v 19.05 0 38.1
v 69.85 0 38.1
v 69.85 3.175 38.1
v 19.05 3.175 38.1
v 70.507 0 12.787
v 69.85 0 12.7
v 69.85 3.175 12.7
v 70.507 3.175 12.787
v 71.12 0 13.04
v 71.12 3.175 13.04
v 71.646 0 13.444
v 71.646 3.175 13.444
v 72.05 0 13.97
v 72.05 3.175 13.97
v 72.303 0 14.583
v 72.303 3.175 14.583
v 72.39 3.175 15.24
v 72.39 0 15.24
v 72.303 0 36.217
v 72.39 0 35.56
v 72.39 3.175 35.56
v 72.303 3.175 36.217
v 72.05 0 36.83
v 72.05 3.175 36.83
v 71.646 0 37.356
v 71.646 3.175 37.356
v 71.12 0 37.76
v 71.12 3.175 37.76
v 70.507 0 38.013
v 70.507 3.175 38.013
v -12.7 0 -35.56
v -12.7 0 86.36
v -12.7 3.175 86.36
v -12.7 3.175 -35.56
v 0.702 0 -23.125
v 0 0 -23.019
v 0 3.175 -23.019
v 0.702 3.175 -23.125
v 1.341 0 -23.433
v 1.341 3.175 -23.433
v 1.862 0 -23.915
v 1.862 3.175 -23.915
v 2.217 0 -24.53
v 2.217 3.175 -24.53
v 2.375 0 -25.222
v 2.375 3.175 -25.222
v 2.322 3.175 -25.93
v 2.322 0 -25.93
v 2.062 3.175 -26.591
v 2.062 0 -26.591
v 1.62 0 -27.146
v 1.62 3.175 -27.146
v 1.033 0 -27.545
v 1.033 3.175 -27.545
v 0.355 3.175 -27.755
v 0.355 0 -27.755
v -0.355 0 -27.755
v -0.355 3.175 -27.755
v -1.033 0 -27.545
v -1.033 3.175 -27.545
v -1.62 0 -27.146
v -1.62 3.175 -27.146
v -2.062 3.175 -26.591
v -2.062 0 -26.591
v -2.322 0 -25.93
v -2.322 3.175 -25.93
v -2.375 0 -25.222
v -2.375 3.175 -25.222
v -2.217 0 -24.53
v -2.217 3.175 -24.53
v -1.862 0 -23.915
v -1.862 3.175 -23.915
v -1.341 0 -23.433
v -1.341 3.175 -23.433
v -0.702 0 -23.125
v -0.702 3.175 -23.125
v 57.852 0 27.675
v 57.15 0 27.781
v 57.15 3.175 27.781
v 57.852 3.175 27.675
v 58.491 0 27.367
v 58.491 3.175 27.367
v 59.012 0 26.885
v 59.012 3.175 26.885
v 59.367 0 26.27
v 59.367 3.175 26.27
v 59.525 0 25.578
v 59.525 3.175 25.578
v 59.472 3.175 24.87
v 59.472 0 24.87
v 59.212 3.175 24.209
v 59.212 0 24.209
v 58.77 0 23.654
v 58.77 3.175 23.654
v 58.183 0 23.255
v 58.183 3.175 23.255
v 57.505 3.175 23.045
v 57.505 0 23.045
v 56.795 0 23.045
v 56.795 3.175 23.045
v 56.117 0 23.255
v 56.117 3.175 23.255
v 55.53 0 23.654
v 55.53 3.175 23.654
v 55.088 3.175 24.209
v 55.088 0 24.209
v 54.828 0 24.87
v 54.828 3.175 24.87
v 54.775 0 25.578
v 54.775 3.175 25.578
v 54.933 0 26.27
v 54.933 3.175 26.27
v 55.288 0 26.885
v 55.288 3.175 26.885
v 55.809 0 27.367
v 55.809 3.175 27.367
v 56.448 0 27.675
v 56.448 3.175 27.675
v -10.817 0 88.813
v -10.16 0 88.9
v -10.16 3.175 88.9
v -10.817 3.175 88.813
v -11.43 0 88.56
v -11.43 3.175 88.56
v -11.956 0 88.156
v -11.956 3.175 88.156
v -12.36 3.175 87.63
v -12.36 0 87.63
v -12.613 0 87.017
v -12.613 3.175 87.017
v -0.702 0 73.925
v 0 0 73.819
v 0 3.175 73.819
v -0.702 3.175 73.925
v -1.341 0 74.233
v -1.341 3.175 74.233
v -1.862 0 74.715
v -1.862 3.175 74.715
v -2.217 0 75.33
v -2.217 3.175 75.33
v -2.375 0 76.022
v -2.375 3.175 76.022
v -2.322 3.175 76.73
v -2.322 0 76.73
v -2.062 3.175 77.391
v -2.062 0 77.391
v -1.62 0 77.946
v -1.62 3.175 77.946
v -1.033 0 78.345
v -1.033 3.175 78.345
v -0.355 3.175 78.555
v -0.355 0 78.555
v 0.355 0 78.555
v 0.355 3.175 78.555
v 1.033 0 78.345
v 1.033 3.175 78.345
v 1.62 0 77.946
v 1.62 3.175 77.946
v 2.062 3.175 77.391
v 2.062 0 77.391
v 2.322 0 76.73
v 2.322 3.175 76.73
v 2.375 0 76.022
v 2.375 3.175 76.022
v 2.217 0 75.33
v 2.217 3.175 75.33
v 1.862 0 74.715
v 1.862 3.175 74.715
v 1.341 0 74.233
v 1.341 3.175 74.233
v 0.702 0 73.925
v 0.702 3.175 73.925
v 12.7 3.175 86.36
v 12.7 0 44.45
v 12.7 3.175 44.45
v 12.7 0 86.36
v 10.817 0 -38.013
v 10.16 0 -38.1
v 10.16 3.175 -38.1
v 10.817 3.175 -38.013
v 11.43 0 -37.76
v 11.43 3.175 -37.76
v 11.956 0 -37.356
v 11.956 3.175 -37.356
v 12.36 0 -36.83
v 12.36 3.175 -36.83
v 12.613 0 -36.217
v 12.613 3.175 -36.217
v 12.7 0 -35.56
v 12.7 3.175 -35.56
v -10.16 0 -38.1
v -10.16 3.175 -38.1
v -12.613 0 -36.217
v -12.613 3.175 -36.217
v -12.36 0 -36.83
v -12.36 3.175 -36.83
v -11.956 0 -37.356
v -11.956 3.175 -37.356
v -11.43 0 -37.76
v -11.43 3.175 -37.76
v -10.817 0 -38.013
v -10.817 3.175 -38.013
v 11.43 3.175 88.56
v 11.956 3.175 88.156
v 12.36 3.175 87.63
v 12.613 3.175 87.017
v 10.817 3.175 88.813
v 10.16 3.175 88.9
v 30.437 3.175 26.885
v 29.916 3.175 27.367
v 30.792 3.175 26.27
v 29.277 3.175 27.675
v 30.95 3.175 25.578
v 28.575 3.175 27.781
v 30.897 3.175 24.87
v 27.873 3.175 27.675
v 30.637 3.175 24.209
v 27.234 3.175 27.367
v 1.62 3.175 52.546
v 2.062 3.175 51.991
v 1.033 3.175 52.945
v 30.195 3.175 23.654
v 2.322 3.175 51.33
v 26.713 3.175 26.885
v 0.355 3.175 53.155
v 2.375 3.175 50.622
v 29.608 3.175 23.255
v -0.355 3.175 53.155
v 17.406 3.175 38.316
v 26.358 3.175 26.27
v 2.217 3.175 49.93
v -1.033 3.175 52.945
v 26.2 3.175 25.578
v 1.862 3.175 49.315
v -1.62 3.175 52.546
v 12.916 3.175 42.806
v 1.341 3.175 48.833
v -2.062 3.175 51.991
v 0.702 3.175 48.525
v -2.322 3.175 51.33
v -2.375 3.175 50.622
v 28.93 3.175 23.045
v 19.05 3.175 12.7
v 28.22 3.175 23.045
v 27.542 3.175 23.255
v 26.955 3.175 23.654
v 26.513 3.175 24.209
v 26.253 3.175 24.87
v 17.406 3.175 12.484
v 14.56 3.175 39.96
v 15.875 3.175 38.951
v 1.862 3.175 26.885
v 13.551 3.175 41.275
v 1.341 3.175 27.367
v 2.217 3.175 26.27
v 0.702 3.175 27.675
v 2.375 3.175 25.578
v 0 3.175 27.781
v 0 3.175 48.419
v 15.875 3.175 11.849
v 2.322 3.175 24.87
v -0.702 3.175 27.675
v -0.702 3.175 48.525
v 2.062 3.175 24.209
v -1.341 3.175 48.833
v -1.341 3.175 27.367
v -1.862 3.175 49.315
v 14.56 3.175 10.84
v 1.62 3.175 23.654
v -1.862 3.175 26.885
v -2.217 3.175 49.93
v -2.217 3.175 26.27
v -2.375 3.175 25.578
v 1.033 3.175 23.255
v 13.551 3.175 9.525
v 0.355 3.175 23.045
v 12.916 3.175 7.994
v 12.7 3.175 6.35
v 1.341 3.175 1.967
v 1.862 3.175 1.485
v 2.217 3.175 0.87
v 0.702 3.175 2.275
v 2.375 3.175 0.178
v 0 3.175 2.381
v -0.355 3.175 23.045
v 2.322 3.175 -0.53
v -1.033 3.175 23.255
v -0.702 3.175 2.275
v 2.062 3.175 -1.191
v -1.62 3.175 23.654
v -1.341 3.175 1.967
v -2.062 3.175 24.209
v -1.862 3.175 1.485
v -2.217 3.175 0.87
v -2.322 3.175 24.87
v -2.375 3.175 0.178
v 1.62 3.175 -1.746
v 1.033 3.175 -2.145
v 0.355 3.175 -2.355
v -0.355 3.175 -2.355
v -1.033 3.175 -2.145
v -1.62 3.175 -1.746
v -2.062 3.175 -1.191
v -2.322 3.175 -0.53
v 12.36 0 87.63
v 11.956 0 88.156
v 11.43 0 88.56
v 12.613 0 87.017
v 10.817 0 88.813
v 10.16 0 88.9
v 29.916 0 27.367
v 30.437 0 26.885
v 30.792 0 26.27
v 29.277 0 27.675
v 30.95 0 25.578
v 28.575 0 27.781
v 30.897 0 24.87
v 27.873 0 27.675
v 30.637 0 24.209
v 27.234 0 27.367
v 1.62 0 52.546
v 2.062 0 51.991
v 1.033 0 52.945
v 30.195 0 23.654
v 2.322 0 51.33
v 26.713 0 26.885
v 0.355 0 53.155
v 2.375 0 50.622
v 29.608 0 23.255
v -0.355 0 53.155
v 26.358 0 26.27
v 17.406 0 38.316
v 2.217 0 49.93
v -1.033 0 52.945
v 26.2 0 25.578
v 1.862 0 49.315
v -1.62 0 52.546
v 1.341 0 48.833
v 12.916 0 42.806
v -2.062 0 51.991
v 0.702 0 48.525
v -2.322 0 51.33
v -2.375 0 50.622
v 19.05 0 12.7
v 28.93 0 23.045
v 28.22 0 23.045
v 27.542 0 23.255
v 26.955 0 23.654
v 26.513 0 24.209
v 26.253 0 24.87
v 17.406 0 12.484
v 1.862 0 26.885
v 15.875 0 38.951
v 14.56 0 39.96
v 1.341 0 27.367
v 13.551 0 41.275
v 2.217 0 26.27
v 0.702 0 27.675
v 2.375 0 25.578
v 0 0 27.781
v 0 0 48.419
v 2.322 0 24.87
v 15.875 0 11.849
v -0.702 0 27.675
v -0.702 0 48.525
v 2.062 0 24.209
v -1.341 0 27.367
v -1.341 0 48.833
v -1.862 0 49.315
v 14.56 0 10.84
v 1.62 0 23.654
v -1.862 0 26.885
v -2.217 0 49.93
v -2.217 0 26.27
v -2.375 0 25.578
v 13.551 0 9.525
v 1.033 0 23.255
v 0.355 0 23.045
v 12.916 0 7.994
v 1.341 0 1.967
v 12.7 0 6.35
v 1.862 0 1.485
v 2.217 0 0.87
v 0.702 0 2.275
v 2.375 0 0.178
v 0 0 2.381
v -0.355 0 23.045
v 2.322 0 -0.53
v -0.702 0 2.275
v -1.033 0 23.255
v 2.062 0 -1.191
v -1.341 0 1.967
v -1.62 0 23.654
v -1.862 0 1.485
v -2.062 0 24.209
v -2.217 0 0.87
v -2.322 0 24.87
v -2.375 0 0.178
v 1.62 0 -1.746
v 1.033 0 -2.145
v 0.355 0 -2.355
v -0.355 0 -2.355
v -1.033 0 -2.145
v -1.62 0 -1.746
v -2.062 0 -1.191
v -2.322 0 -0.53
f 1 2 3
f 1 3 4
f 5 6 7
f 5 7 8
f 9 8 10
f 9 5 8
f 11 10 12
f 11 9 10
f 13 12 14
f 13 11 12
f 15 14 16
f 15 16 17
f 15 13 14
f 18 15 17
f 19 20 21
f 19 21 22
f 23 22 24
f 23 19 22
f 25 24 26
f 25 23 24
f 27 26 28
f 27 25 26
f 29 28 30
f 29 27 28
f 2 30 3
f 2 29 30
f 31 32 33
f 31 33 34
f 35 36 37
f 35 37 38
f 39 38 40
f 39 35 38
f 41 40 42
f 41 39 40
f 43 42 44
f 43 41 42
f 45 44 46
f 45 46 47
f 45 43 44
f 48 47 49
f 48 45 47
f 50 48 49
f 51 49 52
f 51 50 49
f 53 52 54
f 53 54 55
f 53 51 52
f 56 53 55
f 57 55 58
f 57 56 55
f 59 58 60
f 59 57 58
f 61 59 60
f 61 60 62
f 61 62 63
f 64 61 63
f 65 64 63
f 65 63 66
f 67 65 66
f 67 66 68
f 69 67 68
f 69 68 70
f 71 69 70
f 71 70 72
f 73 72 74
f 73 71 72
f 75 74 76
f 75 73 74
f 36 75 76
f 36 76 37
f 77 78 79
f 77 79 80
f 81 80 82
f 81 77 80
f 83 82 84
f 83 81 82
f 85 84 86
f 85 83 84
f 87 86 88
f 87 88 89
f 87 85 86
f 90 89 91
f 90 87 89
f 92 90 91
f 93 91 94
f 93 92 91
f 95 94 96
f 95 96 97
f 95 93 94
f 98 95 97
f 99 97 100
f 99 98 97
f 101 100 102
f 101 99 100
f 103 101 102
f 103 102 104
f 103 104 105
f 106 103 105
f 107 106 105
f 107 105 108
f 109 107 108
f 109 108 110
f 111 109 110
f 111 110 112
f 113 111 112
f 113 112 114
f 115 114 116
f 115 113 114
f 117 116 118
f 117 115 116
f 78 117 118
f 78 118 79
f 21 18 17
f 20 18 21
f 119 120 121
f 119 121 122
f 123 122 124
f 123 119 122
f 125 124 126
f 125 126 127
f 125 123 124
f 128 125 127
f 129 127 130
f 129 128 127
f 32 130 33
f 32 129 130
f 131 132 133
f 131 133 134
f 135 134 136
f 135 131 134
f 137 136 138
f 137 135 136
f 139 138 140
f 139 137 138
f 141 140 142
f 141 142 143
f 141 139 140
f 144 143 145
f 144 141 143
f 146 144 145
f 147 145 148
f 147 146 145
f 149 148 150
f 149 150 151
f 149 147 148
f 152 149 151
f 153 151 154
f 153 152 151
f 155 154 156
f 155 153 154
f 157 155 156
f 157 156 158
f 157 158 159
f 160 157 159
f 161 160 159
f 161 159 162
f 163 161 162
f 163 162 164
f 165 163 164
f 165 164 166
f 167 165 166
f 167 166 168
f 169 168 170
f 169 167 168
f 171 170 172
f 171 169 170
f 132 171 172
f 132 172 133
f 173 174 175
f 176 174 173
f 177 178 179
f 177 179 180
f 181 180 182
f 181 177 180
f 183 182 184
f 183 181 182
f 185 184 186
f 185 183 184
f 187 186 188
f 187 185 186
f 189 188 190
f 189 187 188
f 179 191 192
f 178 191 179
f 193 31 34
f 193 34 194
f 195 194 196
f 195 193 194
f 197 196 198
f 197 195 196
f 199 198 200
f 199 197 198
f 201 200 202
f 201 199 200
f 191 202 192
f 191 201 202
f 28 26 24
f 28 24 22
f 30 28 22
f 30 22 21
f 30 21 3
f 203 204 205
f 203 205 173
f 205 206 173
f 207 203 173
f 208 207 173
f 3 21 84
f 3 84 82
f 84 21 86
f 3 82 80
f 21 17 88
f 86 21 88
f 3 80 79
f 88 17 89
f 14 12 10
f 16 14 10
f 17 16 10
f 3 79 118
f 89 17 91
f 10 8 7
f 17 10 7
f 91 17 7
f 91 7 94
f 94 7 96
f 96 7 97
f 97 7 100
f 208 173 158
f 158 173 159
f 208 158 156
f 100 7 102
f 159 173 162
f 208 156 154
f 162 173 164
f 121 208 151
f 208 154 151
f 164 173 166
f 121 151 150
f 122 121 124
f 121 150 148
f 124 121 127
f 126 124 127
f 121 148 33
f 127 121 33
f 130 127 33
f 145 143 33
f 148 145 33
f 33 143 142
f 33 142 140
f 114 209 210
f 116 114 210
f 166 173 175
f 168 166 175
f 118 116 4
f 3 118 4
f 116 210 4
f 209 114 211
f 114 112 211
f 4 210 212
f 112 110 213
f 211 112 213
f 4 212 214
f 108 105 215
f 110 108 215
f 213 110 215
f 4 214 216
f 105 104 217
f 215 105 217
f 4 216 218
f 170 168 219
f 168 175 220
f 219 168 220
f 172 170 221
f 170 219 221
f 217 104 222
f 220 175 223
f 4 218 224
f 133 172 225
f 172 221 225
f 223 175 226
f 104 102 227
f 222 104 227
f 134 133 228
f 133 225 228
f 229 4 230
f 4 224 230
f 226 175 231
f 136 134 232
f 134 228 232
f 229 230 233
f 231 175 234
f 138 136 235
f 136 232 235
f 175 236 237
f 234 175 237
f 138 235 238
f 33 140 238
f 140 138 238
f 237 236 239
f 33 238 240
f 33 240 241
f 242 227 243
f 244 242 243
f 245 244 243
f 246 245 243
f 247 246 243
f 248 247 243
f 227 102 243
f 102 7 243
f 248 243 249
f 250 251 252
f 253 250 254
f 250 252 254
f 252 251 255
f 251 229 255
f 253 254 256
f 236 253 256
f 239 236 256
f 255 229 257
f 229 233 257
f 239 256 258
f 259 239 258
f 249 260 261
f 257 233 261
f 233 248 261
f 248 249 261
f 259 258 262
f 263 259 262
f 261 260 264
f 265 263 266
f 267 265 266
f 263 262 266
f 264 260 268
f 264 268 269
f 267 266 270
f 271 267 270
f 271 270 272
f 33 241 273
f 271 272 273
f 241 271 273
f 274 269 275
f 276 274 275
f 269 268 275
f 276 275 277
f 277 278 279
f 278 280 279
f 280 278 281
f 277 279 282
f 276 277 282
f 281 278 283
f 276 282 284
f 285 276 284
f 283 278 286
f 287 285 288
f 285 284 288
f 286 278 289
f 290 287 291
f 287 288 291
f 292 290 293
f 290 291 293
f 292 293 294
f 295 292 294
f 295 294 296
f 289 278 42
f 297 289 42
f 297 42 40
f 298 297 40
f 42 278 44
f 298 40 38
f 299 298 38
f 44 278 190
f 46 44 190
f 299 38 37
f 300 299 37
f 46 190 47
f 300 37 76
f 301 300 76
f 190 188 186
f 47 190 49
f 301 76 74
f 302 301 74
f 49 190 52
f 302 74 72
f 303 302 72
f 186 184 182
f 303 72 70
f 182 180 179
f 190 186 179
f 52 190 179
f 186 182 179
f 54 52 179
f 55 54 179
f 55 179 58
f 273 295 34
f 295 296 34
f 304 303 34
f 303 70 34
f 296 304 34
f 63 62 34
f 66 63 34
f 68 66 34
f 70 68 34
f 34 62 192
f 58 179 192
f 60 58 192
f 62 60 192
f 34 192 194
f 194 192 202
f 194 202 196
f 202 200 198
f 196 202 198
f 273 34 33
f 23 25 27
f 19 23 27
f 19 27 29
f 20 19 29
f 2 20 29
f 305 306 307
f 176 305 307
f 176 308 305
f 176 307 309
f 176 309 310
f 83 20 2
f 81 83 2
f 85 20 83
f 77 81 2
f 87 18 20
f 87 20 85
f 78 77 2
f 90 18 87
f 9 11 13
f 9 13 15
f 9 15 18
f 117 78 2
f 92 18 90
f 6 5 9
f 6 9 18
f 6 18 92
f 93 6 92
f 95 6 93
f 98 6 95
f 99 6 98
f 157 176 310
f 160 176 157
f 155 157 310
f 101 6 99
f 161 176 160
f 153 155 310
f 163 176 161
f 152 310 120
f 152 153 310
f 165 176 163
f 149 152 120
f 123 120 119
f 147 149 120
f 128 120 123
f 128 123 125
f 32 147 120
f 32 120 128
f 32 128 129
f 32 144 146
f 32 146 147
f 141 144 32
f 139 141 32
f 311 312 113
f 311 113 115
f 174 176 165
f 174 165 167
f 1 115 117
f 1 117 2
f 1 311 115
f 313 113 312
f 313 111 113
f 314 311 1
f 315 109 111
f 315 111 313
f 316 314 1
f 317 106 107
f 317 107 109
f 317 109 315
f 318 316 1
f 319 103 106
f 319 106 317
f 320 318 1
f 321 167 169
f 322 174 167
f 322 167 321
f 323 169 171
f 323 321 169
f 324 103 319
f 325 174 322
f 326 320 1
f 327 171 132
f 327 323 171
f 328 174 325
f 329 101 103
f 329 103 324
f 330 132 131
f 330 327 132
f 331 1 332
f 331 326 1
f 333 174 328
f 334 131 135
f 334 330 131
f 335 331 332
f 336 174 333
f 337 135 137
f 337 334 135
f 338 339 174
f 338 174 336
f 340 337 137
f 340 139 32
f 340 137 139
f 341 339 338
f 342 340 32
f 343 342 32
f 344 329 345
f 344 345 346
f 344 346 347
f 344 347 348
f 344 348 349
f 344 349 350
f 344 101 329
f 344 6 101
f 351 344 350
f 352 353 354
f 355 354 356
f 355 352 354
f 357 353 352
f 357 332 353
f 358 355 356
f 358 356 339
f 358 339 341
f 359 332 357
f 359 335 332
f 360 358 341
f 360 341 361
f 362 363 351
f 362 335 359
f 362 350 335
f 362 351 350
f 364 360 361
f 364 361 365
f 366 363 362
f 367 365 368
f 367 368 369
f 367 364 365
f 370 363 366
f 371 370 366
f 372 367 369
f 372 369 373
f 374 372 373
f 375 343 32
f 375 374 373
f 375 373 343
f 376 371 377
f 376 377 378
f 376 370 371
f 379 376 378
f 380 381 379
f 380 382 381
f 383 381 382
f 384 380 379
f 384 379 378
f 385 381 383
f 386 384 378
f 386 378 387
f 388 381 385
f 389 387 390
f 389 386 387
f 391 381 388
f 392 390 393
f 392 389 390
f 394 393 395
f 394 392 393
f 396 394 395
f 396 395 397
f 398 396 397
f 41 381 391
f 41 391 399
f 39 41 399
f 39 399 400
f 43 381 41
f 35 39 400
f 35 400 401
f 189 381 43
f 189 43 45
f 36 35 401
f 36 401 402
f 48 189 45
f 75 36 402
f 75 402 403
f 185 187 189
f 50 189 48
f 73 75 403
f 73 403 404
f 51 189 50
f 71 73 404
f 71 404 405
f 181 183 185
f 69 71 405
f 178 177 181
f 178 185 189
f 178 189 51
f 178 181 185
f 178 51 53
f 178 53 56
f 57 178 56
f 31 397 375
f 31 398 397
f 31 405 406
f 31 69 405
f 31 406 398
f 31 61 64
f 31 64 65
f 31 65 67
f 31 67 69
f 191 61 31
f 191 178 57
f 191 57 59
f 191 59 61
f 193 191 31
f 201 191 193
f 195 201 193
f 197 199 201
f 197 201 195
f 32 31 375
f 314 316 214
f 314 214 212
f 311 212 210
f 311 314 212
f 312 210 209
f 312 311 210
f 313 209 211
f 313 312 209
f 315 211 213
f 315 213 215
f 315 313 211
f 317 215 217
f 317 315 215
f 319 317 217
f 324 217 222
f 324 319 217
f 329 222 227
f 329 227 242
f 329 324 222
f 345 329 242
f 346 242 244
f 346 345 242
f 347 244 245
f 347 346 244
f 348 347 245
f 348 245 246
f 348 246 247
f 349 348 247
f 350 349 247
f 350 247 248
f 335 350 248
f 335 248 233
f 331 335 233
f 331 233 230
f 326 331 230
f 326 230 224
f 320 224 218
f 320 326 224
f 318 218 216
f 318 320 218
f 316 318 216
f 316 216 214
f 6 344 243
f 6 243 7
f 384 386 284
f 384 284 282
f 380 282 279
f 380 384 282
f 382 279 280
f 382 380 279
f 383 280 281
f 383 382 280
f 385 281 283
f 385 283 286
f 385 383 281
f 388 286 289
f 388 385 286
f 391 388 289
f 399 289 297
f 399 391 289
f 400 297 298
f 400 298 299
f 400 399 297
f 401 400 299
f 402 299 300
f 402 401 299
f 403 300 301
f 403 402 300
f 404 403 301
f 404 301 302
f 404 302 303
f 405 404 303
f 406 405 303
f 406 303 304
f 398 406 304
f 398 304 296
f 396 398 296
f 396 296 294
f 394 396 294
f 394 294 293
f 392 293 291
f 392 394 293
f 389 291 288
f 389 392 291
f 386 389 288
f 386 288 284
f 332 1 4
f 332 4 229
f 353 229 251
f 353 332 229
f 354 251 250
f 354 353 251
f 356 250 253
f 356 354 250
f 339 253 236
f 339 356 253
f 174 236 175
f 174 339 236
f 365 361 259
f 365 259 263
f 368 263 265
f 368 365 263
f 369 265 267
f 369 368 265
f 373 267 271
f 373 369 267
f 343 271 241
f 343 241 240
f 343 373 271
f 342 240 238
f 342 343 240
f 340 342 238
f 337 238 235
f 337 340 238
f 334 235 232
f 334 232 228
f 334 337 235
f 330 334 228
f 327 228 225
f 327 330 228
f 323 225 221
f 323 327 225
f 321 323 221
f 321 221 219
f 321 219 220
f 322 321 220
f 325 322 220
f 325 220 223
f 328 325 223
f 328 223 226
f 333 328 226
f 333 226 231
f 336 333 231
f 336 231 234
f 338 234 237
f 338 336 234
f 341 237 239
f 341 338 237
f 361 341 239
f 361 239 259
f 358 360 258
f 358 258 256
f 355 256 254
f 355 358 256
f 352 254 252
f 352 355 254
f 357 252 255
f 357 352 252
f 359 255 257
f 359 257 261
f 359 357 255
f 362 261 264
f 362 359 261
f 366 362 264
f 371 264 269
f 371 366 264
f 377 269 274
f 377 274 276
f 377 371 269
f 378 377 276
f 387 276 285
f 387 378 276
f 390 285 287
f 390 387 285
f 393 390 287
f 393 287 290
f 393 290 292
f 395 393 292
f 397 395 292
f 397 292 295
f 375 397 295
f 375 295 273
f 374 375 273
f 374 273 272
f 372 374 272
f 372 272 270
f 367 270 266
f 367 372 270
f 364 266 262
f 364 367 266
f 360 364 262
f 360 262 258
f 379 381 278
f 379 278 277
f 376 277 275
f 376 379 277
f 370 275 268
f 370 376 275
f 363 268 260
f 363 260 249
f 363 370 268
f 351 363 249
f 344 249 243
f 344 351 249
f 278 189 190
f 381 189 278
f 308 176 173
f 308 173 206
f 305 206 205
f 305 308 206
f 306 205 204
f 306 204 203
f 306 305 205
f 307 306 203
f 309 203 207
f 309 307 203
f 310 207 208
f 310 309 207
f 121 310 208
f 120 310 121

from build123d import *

# Parameters (mm, degrees)
SKETCH1_R           = 2.38125
BOSS_EXTRUDE1_DEPTH = 3.175


with BuildPart() as part:
    # Sketch1 → Boss-Extrude1 (new body)
    with BuildSketch(Plane(origin=(0, 0, 0), x_dir=(1, 0, 0), z_dir=(0, 1, 0))):
        with BuildLine():
            Line((-12.7, -38.1), (-12.7, -35.56))
            Line((-12.7, -35.56), (-12.7, 35.56))
            ThreePointArc((-12.7, 35.56), (-11.956051224, 37.356051224), (-10.16, 38.1))
            Line((-10.16, 38.1), (10.16, 38.1))
            ThreePointArc((10.16, 38.1), (11.956051224, 37.356051224), (12.7, 35.56))
            Line((12.7, 35.56), (12.7, -6.35))
            ThreePointArc((12.7, -6.35), (14.559871939, -10.840128061), (19.05, -12.7))
            Line((19.05, -12.7), (69.85, -12.7))
            ThreePointArc((69.85, -12.7), (71.646051224, -13.443948776), (72.39, -15.24))
            Line((72.39, -15.24), (72.39, -35.56))
            ThreePointArc((72.39, -35.56), (71.646051224, -37.356051224), (69.85, -38.1))
            Line((69.85, -38.1), (19.05, -38.1))
            ThreePointArc((19.05, -38.1), (14.559871939, -39.959871939), (12.7, -44.45))
            Line((12.7, -44.45), (12.7, -86.36))
            ThreePointArc((12.7, -86.36), (11.956051224, -88.156051224), (10.16, -88.9))
            Line((10.16, -88.9), (-10.16, -88.9))
            ThreePointArc((-10.16, -88.9), (-11.956051224, -88.156051224), (-12.7, -86.36))
            Line((-12.7, -86.36), (-12.7, -38.1))
        make_face()
        with Locations(Location((0, -25.4, 0), (0, 0, 270))):
            Circle(SKETCH1_R, mode=Mode.SUBTRACT)
        with Locations(Location((0, 0, 0), (0, 0, 270))):
            Circle(SKETCH1_R, mode=Mode.SUBTRACT)
        with Locations(Location((0, 25.4, 0), (0, 0, 270))):
            Circle(SKETCH1_R, mode=Mode.SUBTRACT)
        with Locations(Location((28.575, -25.4, 0), (0, 0, 270))):
            Circle(SKETCH1_R, mode=Mode.SUBTRACT)
        with Locations(Location((57.15, -25.4, 0), (0, 0, 270))):
            Circle(SKETCH1_R, mode=Mode.SUBTRACT)
        with Locations(Location((0, -76.2, 0), (0, 0, 90))):
            Circle(SKETCH1_R, mode=Mode.SUBTRACT)
        with Locations(Location((0, -50.8, 0), (0, 0, 90))):
            Circle(SKETCH1_R, mode=Mode.SUBTRACT)
    extrude(amount=BOSS_EXTRUDE1_DEPTH)


solid = part.part
